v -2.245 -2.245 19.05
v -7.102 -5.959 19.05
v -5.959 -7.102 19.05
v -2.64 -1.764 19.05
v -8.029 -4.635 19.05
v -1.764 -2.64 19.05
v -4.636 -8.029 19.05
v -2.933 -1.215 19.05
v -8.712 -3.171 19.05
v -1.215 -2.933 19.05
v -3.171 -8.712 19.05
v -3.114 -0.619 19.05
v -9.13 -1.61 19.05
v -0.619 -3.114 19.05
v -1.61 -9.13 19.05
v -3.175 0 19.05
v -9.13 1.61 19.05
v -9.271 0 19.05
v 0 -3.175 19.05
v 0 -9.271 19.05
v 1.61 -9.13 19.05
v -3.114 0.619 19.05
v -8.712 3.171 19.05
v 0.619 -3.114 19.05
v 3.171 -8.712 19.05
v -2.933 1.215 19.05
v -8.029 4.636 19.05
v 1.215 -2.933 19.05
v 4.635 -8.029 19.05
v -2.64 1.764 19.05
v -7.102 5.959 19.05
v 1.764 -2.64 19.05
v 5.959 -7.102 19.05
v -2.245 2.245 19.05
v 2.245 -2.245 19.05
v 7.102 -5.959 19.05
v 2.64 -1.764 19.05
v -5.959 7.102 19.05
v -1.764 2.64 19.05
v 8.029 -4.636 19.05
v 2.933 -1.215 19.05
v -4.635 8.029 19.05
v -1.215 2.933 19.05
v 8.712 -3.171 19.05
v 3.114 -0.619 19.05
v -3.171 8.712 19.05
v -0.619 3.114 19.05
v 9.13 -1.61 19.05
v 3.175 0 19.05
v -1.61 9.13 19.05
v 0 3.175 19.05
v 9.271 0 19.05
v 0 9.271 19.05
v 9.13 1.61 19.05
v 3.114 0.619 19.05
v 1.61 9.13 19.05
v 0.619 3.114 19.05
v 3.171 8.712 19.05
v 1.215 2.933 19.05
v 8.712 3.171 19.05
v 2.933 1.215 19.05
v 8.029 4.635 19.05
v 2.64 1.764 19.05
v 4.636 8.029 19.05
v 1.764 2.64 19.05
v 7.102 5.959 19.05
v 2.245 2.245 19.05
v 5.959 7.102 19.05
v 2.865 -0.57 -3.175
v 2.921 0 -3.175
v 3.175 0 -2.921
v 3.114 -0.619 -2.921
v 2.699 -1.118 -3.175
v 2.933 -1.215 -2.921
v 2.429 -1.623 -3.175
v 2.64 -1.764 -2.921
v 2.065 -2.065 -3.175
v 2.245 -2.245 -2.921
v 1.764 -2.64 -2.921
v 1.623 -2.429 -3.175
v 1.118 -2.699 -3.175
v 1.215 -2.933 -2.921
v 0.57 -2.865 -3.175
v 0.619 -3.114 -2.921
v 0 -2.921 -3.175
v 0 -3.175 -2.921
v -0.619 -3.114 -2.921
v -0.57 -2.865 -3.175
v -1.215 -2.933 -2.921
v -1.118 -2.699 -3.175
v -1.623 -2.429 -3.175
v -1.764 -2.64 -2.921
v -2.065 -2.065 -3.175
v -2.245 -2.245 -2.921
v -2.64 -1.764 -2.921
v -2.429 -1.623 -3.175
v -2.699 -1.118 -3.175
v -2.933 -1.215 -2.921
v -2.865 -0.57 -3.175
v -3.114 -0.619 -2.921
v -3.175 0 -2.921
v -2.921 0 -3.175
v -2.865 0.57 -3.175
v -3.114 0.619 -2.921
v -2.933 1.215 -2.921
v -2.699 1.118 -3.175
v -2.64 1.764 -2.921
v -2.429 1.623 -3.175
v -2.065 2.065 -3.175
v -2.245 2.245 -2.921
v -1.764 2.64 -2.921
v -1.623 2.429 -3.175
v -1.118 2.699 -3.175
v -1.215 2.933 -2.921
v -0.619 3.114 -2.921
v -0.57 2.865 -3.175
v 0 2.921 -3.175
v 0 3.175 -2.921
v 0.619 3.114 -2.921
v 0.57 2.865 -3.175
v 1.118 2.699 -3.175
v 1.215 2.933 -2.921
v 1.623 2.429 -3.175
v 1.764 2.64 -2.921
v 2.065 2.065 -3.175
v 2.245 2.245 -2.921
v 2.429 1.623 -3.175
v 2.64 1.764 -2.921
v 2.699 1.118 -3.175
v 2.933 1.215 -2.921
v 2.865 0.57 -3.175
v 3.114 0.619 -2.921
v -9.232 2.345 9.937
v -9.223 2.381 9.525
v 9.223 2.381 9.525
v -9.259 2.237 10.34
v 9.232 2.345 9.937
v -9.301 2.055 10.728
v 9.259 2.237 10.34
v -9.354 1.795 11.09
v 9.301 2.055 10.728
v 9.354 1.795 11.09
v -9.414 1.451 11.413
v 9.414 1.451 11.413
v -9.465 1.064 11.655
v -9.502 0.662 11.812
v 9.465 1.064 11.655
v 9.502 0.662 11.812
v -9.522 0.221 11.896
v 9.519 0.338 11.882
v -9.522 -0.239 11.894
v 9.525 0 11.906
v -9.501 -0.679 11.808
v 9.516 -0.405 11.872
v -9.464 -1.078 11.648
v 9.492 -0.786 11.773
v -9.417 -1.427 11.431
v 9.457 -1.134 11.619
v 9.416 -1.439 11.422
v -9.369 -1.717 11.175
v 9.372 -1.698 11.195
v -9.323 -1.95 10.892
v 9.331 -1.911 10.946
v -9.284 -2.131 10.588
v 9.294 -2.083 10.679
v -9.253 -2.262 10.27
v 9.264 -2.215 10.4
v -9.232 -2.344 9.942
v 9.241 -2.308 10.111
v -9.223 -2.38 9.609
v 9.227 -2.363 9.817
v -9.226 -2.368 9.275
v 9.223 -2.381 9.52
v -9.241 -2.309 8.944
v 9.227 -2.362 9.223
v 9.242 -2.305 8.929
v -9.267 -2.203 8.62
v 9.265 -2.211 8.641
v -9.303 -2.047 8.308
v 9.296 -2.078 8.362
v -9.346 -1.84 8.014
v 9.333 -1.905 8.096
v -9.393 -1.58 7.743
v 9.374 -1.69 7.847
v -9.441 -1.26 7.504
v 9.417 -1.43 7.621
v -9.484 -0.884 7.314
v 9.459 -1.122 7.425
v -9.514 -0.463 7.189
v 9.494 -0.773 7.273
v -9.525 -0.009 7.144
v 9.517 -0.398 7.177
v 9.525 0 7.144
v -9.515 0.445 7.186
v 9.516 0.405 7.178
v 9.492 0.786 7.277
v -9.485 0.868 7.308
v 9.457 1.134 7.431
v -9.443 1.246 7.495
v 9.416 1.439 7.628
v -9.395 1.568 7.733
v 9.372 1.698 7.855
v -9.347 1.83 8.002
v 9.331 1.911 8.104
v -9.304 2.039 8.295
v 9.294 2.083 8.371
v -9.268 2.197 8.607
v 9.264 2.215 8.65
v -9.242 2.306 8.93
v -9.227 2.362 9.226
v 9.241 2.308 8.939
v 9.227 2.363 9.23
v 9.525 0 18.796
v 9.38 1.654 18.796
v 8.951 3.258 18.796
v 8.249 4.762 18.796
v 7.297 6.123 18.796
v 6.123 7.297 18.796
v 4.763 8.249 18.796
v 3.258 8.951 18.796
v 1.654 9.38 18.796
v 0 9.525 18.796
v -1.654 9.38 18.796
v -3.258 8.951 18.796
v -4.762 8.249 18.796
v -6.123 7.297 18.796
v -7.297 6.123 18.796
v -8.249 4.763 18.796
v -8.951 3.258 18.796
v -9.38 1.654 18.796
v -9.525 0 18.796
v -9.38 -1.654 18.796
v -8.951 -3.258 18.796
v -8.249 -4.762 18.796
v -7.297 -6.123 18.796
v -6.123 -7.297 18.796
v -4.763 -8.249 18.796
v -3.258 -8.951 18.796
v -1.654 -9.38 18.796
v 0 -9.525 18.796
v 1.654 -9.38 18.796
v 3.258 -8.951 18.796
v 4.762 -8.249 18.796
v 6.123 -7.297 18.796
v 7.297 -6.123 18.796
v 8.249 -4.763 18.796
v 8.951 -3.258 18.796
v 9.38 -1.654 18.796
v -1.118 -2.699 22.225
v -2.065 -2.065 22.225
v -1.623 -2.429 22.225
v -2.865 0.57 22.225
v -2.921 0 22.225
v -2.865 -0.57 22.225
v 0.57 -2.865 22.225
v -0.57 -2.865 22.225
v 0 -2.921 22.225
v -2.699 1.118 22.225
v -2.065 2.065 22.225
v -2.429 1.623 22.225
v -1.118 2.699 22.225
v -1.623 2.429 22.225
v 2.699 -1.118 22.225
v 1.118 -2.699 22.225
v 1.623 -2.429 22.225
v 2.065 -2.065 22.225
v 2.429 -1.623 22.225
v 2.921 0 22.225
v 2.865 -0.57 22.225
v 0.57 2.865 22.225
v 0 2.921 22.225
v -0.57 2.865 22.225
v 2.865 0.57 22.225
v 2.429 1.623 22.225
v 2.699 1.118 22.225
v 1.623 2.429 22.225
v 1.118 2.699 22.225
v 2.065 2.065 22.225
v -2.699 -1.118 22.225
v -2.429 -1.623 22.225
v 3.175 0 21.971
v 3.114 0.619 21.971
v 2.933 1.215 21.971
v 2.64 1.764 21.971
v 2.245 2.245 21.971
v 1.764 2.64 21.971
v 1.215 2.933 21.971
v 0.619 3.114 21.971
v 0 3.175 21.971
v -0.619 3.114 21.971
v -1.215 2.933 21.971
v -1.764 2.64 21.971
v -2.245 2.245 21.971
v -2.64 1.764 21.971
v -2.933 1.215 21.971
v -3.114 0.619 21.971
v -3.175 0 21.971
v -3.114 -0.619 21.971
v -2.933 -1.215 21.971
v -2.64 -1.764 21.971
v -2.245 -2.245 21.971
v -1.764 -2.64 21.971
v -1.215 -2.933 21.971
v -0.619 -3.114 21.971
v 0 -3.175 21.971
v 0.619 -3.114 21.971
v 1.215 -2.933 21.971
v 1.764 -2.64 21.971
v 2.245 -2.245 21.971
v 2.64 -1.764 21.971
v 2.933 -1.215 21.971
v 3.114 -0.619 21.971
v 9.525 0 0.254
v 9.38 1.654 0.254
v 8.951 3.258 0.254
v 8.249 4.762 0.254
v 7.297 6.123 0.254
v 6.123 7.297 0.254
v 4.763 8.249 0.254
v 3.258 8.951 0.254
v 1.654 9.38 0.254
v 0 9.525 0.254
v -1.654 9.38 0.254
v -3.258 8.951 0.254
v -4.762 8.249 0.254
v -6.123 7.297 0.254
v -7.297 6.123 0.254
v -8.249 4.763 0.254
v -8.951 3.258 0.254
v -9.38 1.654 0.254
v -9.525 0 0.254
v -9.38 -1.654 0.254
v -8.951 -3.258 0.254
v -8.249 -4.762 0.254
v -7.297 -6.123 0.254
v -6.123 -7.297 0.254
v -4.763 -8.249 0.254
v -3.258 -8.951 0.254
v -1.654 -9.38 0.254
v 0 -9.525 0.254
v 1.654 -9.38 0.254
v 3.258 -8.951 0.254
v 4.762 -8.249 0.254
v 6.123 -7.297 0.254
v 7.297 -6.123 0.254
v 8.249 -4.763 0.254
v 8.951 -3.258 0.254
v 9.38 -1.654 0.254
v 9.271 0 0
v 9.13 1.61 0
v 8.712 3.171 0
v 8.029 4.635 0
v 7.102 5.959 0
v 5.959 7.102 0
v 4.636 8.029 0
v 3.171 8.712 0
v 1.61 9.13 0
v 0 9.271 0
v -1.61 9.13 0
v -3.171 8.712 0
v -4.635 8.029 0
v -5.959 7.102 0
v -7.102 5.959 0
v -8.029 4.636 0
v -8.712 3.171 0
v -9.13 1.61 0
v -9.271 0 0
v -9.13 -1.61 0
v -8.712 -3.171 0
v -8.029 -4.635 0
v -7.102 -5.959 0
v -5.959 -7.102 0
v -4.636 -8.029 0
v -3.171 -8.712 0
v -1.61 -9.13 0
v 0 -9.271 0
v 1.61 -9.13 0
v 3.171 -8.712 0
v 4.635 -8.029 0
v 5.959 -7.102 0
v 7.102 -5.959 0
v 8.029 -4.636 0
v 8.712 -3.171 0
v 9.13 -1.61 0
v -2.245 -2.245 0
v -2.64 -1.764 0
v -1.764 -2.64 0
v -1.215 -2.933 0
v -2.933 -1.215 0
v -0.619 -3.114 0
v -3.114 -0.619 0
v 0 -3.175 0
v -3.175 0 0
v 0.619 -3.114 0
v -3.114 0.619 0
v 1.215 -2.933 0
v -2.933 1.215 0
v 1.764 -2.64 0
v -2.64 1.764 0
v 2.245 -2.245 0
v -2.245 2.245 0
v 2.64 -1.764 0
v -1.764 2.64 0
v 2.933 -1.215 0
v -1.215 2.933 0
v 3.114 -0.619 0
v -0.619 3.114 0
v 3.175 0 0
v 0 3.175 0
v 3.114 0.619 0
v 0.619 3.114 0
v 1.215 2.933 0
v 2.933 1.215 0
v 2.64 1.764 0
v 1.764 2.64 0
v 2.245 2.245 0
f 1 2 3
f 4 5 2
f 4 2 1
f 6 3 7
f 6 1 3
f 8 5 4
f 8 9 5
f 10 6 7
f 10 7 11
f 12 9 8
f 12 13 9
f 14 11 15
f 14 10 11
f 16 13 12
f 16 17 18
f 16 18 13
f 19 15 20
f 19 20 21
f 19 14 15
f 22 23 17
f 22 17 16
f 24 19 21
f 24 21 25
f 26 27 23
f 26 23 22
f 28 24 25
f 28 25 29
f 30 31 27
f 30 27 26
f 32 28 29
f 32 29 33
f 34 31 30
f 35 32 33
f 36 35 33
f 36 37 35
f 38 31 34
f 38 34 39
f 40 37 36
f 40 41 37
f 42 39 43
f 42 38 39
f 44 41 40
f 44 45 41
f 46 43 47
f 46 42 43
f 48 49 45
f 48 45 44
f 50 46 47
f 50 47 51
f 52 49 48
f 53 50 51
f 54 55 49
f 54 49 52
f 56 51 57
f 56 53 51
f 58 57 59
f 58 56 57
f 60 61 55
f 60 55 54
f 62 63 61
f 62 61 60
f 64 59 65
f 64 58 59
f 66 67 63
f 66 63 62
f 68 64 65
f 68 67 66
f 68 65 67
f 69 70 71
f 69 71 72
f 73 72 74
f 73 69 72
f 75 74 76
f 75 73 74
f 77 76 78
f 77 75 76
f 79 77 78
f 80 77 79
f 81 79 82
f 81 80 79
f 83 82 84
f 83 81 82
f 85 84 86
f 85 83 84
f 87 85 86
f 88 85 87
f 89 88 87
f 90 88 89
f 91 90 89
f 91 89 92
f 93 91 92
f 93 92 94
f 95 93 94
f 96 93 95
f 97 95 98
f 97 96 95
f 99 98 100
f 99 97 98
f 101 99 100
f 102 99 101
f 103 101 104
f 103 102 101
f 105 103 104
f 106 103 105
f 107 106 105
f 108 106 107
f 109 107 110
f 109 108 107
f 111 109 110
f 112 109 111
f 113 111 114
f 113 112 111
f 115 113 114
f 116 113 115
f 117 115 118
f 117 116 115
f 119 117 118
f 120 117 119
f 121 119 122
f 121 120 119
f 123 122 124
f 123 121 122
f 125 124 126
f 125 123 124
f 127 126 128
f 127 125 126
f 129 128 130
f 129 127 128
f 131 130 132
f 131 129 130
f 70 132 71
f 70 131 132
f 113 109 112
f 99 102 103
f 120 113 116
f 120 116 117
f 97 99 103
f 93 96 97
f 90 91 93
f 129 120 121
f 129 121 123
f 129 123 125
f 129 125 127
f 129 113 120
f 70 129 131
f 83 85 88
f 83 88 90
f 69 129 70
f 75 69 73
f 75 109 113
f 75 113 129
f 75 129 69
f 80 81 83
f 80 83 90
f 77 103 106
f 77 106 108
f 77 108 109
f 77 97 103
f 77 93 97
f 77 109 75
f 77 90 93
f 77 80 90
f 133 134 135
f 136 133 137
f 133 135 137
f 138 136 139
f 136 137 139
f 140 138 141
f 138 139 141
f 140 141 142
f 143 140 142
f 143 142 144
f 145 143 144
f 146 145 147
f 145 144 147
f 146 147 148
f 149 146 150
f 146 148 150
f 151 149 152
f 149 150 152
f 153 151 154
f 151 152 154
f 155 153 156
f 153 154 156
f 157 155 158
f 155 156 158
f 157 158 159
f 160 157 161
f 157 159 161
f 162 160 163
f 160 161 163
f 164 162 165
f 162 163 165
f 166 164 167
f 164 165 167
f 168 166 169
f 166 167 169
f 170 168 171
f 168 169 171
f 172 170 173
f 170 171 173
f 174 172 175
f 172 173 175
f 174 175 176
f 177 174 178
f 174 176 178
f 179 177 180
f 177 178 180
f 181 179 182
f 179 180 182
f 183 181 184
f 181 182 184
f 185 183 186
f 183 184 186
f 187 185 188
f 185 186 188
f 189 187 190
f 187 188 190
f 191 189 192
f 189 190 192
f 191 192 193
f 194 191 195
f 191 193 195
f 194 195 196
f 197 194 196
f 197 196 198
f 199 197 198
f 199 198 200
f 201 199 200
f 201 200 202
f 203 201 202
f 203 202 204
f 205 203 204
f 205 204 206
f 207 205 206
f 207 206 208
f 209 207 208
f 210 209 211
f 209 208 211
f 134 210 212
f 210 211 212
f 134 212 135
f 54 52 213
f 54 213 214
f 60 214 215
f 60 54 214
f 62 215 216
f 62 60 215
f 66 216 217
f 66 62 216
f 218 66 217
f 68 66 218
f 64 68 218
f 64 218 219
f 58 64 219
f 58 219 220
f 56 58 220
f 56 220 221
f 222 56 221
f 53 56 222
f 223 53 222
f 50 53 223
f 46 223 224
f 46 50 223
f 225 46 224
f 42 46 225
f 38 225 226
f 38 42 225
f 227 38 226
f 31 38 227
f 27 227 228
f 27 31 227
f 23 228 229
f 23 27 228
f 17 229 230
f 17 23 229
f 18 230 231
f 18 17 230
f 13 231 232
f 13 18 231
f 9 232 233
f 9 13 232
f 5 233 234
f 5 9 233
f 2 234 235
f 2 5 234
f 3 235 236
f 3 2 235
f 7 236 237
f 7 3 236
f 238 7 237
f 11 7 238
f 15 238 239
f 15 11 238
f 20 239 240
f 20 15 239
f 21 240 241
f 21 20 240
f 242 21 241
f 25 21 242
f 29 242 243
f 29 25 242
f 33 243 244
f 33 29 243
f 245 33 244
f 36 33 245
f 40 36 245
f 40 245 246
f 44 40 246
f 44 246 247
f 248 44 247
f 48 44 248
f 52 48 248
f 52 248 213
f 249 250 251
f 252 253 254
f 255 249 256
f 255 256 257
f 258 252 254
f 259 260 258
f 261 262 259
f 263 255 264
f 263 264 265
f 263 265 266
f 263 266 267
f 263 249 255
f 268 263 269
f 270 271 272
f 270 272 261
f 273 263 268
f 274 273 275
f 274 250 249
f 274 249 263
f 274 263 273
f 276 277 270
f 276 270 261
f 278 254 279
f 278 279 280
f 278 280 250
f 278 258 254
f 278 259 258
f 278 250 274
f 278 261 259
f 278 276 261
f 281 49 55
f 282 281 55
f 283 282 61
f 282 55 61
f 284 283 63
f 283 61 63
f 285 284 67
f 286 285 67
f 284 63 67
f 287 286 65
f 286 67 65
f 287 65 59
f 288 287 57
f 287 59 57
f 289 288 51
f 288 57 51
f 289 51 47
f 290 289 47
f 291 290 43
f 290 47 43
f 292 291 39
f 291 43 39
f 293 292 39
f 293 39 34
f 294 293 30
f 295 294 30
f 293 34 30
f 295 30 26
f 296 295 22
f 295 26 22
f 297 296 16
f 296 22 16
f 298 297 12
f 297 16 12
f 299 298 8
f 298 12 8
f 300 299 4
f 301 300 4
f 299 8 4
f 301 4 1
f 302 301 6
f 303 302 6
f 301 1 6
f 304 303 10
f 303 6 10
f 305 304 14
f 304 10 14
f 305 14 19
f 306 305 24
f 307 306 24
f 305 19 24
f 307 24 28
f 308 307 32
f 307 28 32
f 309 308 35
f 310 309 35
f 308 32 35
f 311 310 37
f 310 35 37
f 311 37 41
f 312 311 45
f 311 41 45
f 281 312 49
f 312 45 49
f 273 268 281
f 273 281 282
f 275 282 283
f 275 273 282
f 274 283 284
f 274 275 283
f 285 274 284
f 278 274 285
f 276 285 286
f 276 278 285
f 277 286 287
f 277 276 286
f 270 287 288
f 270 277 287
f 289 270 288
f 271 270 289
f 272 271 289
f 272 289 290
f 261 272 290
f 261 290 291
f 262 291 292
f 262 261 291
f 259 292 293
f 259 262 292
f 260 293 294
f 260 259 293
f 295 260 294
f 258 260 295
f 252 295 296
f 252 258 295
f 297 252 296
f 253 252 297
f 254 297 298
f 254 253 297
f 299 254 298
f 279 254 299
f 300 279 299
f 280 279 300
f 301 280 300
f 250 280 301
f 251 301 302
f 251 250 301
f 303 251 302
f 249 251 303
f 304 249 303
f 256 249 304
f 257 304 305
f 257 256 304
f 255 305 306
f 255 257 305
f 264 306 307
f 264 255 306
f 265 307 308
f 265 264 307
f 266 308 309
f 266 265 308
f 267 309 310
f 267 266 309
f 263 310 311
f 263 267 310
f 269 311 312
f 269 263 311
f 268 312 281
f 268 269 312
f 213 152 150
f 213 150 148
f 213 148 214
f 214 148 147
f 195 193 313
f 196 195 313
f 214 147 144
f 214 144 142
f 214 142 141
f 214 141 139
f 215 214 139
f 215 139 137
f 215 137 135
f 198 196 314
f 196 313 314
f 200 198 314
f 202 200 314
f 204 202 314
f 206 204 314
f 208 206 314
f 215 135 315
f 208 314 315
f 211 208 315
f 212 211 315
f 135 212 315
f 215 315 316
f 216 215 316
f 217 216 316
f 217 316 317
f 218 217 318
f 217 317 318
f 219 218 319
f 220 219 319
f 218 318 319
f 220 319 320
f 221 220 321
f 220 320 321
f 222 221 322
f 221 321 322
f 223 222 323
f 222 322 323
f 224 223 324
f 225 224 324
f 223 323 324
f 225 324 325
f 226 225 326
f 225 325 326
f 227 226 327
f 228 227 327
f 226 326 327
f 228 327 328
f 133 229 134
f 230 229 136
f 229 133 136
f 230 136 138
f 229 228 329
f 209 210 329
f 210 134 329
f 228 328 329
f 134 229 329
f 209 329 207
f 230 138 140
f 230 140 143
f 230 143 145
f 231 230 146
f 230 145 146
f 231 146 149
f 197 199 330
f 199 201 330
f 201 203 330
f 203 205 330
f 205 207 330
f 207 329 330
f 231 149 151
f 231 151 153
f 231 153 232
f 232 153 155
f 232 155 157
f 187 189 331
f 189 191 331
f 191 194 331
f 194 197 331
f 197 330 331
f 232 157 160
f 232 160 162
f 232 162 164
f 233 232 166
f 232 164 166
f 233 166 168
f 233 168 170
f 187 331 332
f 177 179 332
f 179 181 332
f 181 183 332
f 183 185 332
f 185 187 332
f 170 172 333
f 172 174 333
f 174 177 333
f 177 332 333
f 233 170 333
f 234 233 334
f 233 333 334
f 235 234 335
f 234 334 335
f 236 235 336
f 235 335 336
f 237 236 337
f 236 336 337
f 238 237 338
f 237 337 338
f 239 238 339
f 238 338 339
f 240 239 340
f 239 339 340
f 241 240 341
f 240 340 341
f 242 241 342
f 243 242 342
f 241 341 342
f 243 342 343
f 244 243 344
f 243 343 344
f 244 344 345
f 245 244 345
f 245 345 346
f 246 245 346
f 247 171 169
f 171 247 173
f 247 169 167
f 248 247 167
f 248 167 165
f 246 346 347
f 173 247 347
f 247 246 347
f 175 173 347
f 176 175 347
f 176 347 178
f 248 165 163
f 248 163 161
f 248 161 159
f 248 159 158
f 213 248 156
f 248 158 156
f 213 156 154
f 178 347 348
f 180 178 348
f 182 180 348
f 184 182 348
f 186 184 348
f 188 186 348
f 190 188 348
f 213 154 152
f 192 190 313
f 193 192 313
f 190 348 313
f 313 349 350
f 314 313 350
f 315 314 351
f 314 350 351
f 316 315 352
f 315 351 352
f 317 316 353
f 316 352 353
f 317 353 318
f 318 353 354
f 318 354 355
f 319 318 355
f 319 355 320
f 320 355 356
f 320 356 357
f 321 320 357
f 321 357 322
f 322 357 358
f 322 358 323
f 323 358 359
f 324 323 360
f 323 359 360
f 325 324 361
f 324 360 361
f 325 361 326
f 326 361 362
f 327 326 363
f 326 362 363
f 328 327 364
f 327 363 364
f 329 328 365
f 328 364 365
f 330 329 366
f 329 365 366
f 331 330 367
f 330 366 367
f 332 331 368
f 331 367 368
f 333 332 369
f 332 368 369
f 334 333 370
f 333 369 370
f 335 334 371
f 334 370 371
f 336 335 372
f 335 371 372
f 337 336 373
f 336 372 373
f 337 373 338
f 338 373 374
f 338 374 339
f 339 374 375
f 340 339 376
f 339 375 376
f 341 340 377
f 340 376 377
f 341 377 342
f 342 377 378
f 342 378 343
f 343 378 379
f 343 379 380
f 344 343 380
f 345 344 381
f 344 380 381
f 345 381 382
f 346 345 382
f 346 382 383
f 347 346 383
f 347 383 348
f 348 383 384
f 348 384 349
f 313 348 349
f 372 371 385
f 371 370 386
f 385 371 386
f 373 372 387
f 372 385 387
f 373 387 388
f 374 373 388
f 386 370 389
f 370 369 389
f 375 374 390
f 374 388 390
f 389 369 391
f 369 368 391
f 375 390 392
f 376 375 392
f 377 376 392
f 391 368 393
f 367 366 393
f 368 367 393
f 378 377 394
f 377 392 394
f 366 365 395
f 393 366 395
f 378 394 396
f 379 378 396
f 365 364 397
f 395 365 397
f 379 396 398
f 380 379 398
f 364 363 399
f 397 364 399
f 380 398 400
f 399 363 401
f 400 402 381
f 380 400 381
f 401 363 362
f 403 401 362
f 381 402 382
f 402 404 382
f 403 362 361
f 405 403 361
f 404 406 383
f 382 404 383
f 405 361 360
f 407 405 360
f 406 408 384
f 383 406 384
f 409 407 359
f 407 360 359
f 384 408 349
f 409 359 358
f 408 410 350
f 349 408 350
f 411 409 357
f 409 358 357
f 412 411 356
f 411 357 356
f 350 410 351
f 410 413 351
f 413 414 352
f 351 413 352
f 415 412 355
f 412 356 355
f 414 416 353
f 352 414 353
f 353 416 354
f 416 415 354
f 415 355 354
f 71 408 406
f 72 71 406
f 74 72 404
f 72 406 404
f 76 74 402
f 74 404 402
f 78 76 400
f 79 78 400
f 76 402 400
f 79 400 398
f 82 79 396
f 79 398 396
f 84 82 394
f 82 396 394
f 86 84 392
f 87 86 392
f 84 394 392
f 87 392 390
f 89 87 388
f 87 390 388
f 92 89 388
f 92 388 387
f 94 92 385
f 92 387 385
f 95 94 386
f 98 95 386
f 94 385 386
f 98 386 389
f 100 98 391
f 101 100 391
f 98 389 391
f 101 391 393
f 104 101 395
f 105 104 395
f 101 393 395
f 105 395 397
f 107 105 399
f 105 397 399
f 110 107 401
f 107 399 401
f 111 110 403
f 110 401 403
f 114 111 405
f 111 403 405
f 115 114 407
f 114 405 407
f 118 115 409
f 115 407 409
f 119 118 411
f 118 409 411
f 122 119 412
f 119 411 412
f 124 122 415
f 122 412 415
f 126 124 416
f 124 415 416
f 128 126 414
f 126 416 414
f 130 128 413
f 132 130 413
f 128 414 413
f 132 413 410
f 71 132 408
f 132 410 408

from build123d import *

# Parameters (mm, degrees)
F0_R     = 9.525
F1_DEPTH = 19.05
F2_R     = 3.175
F3_DEPTH = 3.175
F4_R     = 3.175
F5_DEPTH = 3.175
F6_SIZE  = 0.254
F7_R     = 2.38125
F8_DEPTH = 12.7


with BuildPart() as f1:
    # F0 (on Top) → F1 (new body)
    with BuildSketch(Plane.XY):
        Circle(F0_R)
    extrude(amount=F1_DEPTH)

    # F2 (on face) → F3 (join)
    with BuildSketch(Plane(origin=(0, 0, 0), x_dir=(1, 0, 0), z_dir=(0, 0, -1))):
        Circle(F2_R)
    extrude(amount=F3_DEPTH)

    # F4 (on face) → F5 (join)
    with BuildSketch(Plane.XY.offset(19.05)):
        Circle(F4_R)
    extrude(amount=F5_DEPTH)

    # F6
    f6_edges = [f1.edges().sort_by_distance(p)[0] for p in [
        (-9.525, 0, 19.05),
        (-3.175, 0, -3.175),
        (-9.525, 0, 0),
        (-3.175, 0, 22.225),
    ]]
    chamfer(f6_edges, length=F6_SIZE)

    # F7 (on Right) → F8 (cut, symmetric)
    with BuildSketch(Plane.YZ):
        with Locations((0, 9.525)):
            Circle(F7_R)
    extrude(amount=F8_DEPTH, both=True, mode=Mode.SUBTRACT)


solid = f1.part
